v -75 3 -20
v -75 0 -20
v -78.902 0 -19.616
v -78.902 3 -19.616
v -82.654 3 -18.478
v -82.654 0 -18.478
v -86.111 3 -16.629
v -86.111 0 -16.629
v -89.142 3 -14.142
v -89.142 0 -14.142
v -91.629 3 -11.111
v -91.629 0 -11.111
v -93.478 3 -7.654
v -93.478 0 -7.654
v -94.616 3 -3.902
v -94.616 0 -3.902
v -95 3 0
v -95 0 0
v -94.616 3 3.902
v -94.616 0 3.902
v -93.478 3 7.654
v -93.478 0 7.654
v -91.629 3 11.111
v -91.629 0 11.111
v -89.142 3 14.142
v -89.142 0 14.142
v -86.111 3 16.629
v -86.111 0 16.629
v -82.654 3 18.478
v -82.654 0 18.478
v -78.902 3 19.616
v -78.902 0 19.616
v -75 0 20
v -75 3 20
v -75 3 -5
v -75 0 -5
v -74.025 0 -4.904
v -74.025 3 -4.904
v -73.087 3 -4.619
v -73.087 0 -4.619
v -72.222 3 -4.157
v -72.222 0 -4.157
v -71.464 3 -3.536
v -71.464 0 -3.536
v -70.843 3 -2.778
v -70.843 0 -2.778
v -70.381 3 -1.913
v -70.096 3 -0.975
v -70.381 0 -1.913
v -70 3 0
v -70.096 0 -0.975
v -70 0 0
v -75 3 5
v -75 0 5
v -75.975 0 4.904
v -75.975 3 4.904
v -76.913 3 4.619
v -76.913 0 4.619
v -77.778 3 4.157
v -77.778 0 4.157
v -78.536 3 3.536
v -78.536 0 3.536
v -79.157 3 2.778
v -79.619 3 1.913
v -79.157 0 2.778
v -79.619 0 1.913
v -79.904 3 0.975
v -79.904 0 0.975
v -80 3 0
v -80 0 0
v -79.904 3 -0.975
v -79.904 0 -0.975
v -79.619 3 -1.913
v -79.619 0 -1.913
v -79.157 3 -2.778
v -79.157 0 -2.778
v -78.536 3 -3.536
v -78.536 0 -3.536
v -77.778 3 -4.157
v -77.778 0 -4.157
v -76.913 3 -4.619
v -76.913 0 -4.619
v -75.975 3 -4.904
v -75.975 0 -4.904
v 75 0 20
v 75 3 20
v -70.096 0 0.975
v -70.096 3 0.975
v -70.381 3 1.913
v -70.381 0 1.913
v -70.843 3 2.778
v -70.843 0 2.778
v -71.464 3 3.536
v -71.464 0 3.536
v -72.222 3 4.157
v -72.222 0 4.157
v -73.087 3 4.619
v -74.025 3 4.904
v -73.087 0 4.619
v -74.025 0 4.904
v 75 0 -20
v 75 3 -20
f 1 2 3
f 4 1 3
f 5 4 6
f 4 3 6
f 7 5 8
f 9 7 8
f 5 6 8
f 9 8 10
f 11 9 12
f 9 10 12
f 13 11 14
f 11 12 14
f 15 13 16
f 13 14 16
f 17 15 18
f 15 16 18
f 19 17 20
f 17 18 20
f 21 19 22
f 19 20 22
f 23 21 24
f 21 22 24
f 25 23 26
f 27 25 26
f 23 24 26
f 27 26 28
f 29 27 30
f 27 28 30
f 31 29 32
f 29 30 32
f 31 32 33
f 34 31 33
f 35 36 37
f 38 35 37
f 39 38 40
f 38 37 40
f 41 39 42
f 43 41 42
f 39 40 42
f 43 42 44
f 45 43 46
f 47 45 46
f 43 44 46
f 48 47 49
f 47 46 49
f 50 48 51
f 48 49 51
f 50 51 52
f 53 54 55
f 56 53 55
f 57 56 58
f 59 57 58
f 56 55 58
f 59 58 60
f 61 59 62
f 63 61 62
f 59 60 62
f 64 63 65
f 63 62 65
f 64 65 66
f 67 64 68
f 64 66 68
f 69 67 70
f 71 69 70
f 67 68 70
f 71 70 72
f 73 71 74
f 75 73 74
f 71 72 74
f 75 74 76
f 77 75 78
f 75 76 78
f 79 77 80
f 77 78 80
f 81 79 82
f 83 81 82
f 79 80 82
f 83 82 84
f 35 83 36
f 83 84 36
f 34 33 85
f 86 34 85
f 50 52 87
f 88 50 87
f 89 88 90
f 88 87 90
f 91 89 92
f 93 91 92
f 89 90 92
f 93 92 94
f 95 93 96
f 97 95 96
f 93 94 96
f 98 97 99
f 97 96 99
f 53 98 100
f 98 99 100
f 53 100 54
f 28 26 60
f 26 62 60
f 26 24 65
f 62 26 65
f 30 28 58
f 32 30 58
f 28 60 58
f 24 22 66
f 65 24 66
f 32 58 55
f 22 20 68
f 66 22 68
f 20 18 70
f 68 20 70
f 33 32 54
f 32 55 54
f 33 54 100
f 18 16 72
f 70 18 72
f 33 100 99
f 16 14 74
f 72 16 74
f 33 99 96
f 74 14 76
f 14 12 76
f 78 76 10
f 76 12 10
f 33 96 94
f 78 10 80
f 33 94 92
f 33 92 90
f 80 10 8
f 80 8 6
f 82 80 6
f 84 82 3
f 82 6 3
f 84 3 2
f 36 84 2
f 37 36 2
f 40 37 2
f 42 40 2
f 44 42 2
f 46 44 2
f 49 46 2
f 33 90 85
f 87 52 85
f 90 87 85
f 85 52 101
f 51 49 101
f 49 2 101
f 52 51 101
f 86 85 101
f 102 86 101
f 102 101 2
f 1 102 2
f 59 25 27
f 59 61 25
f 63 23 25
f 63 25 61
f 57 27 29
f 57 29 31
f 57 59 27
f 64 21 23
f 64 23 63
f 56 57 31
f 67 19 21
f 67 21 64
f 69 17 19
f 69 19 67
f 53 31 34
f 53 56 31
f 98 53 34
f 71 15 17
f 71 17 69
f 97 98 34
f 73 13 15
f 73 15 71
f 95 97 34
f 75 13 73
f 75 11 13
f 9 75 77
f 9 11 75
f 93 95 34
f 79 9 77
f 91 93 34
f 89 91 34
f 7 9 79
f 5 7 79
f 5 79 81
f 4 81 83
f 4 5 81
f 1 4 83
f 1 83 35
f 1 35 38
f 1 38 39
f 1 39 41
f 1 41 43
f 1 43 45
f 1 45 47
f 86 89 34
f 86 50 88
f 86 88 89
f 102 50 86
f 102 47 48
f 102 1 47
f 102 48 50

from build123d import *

# Parameters (mm, degrees)
BOSS_EXTRUDE1_DEPTH = 3


with BuildPart() as part:
    # Sketch1 → Boss-Extrude1 (new body)
    with BuildSketch(Plane(origin=(0, 0, 0), x_dir=(1, 0, 0), z_dir=(0, 1, 0))):
        with BuildLine():
            ThreePointArc((-75, 20), (-95, 0), (-75, -20))
            Line((-75, -20), (-75, -5))
            ThreePointArc((-75, -5), (-80, 0), (-75, 5))
            Line((-75, 5), (-75, 20))
        make_face()
        with BuildLine():
            Line((-75, -5), (-75, -20))
            ThreePointArc((-75, -20), (-60.857864376, -14.142135624), (-55, 0))
            ThreePointArc((-55, 0), (-60.857864376, 14.142135624), (-75, 20))
            Line((-75, 20), (-75, 5))
            ThreePointArc((-75, 5), (-71.464466094, 3.535533906), (-70, 0))
            ThreePointArc((-70, 0), (-71.464466094, -3.535533906), (-75, -5))
        make_face()
        with BuildLine():
            ThreePointArc((-55, 0), (-60.857864376, -14.142135624), (-75, -20))
            Line((-75, -20), (75, -20))
            Line((75, -20), (75, 20))
            Line((75, 20), (-75, 20))
            ThreePointArc((-75, 20), (-60.857864376, 14.142135624), (-55, 0))
        make_face()
    extrude(amount=BOSS_EXTRUDE1_DEPTH)


solid = part.part
